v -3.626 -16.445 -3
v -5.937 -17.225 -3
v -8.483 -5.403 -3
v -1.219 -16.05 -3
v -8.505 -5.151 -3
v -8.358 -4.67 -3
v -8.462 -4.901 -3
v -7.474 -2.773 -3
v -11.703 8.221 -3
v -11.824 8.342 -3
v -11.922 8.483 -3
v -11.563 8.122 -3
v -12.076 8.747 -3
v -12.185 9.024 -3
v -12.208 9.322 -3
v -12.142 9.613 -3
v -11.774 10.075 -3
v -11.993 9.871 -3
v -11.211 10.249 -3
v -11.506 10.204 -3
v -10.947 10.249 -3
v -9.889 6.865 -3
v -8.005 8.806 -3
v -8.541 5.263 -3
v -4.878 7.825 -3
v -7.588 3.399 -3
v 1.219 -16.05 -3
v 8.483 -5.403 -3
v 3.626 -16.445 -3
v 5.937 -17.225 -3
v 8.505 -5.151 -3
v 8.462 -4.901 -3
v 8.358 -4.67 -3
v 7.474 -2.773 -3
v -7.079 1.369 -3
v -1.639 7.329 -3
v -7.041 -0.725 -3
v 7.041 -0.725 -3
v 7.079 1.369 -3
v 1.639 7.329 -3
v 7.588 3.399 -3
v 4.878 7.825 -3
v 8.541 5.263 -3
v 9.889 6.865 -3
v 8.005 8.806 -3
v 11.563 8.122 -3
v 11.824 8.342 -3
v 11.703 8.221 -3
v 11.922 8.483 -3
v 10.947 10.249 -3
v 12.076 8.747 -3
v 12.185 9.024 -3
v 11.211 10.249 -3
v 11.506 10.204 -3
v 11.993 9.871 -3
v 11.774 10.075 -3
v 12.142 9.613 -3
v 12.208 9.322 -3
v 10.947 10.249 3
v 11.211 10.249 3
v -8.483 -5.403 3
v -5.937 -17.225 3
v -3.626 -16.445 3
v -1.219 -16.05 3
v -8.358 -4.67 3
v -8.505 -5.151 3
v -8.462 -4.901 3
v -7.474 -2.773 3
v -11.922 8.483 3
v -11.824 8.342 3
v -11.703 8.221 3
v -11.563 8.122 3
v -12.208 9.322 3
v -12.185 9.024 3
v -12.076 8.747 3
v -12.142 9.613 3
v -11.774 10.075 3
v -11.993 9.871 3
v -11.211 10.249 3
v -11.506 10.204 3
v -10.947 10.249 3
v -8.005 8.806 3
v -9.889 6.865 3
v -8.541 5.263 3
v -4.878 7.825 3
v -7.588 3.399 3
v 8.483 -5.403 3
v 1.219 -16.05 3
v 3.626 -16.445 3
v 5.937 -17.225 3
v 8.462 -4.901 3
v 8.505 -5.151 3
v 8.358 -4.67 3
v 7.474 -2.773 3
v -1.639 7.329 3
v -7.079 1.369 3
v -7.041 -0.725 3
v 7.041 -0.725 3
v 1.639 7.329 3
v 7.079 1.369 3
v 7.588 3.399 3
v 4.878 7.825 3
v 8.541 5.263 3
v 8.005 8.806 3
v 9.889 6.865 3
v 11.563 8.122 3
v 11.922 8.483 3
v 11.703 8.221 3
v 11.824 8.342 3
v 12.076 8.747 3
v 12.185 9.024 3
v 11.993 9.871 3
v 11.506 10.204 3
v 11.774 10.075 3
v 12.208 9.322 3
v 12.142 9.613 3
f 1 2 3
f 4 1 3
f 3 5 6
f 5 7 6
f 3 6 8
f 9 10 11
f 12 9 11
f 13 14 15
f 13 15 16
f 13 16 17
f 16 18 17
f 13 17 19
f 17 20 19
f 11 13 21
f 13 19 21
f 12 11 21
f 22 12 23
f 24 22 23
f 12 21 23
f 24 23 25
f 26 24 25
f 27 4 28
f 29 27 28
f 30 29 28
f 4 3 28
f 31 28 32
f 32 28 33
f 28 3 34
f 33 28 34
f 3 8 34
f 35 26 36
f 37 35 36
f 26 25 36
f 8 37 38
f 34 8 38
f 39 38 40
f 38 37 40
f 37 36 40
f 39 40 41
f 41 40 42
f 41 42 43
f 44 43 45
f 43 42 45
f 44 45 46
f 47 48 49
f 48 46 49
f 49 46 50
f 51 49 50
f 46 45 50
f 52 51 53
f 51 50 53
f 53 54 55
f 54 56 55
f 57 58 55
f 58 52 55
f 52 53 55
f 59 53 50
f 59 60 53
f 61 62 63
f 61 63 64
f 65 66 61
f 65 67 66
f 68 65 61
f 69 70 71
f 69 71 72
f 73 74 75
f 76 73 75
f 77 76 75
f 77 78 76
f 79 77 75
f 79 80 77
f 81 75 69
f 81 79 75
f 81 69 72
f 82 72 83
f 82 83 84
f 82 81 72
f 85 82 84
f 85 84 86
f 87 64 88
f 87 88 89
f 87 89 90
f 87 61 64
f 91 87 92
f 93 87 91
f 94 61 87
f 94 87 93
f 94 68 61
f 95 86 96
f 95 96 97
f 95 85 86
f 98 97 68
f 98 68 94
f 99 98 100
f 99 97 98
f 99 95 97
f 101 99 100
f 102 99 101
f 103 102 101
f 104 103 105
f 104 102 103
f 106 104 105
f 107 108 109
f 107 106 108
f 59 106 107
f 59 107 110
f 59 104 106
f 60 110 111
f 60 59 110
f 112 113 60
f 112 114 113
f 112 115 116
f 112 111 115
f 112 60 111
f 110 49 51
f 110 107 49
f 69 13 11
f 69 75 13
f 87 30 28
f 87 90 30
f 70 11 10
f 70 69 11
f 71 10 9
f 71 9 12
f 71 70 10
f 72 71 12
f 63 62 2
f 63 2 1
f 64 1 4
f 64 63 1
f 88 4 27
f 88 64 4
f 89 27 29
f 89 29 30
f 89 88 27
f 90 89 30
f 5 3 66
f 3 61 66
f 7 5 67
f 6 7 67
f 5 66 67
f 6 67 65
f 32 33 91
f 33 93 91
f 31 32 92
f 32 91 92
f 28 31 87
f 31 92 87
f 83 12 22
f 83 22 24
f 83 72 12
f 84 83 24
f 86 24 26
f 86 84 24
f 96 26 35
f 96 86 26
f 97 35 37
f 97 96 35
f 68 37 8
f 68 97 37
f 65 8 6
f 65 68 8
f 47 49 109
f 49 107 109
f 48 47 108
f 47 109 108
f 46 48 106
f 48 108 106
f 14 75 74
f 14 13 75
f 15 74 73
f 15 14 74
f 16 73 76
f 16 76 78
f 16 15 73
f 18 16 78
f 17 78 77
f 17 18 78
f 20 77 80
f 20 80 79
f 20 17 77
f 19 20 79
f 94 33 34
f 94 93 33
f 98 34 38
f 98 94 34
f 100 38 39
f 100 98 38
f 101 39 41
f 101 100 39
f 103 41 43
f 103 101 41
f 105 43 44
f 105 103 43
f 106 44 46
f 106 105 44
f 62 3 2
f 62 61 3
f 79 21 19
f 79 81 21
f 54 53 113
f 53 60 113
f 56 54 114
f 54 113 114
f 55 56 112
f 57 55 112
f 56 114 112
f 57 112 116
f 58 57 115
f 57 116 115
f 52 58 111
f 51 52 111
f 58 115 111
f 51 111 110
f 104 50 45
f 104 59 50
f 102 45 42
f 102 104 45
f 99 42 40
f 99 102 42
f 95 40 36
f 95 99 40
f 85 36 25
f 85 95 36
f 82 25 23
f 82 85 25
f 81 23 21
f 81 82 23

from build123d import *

# Parameters (mm, degrees)
F1_DEPTH = 3
F2_R     = 1


# Not quite as in the source:
# - a feature names something its author has since deleted; it is built from what else it names


with BuildPart() as f1:
    # F0 (on Top) → F1 (new body, symmetric)
    with BuildSketch(Plane.XY):
        with BuildLine():
            Line((-12.9470113486, 10.248668018), (-11.7864680784, 8.248668018))
            ThreePointArc((-11.7864680784, 8.248668018), (-7.2595115052, 2.3329471863), (-8.5698451786, -5))
            Line((-8.5698451786, -5), (-5.9368219527, -17.2248722292))
            ThreePointArc((-5.9368219527, -17.2248722292), (0, -16), (5.9368219527, -17.2248722292))
            Line((5.9368219527, -17.2248722292), (8.5698451786, -5))
            ThreePointArc((8.5698451786, -5), (7.2595115052, 2.3329471863), (11.7864680784, 8.248668018))
            Line((11.7864680784, 8.248668018), (12.9470113486, 10.248668018))
            Line((12.9470113486, 10.248668018), (10.9470113486, 10.248668018))
            ThreePointArc((10.9470113486, 10.248668018), (0, 7.2662124228), (-10.9470113486, 10.248668018))
            Line((-10.9470113486, 10.248668018), (-12.9470113486, 10.248668018))
        make_face()
    extrude(amount=F1_DEPTH, both=True)

    # F2
    f2_edges = [f1.edges().sort_by_distance(p)[0] for p in [
        (-12.947011, 10.248668, 0),
        (12.947011, 10.248668, 0),
        (-8.569845, -5, 0),
        (8.569845, -5, 0),
        (11.786468, 8.248668, 0),
        (-11.786468, 8.248668, 0),
    ]]
    fillet(f2_edges, radius=F2_R)


solid = f1.part
